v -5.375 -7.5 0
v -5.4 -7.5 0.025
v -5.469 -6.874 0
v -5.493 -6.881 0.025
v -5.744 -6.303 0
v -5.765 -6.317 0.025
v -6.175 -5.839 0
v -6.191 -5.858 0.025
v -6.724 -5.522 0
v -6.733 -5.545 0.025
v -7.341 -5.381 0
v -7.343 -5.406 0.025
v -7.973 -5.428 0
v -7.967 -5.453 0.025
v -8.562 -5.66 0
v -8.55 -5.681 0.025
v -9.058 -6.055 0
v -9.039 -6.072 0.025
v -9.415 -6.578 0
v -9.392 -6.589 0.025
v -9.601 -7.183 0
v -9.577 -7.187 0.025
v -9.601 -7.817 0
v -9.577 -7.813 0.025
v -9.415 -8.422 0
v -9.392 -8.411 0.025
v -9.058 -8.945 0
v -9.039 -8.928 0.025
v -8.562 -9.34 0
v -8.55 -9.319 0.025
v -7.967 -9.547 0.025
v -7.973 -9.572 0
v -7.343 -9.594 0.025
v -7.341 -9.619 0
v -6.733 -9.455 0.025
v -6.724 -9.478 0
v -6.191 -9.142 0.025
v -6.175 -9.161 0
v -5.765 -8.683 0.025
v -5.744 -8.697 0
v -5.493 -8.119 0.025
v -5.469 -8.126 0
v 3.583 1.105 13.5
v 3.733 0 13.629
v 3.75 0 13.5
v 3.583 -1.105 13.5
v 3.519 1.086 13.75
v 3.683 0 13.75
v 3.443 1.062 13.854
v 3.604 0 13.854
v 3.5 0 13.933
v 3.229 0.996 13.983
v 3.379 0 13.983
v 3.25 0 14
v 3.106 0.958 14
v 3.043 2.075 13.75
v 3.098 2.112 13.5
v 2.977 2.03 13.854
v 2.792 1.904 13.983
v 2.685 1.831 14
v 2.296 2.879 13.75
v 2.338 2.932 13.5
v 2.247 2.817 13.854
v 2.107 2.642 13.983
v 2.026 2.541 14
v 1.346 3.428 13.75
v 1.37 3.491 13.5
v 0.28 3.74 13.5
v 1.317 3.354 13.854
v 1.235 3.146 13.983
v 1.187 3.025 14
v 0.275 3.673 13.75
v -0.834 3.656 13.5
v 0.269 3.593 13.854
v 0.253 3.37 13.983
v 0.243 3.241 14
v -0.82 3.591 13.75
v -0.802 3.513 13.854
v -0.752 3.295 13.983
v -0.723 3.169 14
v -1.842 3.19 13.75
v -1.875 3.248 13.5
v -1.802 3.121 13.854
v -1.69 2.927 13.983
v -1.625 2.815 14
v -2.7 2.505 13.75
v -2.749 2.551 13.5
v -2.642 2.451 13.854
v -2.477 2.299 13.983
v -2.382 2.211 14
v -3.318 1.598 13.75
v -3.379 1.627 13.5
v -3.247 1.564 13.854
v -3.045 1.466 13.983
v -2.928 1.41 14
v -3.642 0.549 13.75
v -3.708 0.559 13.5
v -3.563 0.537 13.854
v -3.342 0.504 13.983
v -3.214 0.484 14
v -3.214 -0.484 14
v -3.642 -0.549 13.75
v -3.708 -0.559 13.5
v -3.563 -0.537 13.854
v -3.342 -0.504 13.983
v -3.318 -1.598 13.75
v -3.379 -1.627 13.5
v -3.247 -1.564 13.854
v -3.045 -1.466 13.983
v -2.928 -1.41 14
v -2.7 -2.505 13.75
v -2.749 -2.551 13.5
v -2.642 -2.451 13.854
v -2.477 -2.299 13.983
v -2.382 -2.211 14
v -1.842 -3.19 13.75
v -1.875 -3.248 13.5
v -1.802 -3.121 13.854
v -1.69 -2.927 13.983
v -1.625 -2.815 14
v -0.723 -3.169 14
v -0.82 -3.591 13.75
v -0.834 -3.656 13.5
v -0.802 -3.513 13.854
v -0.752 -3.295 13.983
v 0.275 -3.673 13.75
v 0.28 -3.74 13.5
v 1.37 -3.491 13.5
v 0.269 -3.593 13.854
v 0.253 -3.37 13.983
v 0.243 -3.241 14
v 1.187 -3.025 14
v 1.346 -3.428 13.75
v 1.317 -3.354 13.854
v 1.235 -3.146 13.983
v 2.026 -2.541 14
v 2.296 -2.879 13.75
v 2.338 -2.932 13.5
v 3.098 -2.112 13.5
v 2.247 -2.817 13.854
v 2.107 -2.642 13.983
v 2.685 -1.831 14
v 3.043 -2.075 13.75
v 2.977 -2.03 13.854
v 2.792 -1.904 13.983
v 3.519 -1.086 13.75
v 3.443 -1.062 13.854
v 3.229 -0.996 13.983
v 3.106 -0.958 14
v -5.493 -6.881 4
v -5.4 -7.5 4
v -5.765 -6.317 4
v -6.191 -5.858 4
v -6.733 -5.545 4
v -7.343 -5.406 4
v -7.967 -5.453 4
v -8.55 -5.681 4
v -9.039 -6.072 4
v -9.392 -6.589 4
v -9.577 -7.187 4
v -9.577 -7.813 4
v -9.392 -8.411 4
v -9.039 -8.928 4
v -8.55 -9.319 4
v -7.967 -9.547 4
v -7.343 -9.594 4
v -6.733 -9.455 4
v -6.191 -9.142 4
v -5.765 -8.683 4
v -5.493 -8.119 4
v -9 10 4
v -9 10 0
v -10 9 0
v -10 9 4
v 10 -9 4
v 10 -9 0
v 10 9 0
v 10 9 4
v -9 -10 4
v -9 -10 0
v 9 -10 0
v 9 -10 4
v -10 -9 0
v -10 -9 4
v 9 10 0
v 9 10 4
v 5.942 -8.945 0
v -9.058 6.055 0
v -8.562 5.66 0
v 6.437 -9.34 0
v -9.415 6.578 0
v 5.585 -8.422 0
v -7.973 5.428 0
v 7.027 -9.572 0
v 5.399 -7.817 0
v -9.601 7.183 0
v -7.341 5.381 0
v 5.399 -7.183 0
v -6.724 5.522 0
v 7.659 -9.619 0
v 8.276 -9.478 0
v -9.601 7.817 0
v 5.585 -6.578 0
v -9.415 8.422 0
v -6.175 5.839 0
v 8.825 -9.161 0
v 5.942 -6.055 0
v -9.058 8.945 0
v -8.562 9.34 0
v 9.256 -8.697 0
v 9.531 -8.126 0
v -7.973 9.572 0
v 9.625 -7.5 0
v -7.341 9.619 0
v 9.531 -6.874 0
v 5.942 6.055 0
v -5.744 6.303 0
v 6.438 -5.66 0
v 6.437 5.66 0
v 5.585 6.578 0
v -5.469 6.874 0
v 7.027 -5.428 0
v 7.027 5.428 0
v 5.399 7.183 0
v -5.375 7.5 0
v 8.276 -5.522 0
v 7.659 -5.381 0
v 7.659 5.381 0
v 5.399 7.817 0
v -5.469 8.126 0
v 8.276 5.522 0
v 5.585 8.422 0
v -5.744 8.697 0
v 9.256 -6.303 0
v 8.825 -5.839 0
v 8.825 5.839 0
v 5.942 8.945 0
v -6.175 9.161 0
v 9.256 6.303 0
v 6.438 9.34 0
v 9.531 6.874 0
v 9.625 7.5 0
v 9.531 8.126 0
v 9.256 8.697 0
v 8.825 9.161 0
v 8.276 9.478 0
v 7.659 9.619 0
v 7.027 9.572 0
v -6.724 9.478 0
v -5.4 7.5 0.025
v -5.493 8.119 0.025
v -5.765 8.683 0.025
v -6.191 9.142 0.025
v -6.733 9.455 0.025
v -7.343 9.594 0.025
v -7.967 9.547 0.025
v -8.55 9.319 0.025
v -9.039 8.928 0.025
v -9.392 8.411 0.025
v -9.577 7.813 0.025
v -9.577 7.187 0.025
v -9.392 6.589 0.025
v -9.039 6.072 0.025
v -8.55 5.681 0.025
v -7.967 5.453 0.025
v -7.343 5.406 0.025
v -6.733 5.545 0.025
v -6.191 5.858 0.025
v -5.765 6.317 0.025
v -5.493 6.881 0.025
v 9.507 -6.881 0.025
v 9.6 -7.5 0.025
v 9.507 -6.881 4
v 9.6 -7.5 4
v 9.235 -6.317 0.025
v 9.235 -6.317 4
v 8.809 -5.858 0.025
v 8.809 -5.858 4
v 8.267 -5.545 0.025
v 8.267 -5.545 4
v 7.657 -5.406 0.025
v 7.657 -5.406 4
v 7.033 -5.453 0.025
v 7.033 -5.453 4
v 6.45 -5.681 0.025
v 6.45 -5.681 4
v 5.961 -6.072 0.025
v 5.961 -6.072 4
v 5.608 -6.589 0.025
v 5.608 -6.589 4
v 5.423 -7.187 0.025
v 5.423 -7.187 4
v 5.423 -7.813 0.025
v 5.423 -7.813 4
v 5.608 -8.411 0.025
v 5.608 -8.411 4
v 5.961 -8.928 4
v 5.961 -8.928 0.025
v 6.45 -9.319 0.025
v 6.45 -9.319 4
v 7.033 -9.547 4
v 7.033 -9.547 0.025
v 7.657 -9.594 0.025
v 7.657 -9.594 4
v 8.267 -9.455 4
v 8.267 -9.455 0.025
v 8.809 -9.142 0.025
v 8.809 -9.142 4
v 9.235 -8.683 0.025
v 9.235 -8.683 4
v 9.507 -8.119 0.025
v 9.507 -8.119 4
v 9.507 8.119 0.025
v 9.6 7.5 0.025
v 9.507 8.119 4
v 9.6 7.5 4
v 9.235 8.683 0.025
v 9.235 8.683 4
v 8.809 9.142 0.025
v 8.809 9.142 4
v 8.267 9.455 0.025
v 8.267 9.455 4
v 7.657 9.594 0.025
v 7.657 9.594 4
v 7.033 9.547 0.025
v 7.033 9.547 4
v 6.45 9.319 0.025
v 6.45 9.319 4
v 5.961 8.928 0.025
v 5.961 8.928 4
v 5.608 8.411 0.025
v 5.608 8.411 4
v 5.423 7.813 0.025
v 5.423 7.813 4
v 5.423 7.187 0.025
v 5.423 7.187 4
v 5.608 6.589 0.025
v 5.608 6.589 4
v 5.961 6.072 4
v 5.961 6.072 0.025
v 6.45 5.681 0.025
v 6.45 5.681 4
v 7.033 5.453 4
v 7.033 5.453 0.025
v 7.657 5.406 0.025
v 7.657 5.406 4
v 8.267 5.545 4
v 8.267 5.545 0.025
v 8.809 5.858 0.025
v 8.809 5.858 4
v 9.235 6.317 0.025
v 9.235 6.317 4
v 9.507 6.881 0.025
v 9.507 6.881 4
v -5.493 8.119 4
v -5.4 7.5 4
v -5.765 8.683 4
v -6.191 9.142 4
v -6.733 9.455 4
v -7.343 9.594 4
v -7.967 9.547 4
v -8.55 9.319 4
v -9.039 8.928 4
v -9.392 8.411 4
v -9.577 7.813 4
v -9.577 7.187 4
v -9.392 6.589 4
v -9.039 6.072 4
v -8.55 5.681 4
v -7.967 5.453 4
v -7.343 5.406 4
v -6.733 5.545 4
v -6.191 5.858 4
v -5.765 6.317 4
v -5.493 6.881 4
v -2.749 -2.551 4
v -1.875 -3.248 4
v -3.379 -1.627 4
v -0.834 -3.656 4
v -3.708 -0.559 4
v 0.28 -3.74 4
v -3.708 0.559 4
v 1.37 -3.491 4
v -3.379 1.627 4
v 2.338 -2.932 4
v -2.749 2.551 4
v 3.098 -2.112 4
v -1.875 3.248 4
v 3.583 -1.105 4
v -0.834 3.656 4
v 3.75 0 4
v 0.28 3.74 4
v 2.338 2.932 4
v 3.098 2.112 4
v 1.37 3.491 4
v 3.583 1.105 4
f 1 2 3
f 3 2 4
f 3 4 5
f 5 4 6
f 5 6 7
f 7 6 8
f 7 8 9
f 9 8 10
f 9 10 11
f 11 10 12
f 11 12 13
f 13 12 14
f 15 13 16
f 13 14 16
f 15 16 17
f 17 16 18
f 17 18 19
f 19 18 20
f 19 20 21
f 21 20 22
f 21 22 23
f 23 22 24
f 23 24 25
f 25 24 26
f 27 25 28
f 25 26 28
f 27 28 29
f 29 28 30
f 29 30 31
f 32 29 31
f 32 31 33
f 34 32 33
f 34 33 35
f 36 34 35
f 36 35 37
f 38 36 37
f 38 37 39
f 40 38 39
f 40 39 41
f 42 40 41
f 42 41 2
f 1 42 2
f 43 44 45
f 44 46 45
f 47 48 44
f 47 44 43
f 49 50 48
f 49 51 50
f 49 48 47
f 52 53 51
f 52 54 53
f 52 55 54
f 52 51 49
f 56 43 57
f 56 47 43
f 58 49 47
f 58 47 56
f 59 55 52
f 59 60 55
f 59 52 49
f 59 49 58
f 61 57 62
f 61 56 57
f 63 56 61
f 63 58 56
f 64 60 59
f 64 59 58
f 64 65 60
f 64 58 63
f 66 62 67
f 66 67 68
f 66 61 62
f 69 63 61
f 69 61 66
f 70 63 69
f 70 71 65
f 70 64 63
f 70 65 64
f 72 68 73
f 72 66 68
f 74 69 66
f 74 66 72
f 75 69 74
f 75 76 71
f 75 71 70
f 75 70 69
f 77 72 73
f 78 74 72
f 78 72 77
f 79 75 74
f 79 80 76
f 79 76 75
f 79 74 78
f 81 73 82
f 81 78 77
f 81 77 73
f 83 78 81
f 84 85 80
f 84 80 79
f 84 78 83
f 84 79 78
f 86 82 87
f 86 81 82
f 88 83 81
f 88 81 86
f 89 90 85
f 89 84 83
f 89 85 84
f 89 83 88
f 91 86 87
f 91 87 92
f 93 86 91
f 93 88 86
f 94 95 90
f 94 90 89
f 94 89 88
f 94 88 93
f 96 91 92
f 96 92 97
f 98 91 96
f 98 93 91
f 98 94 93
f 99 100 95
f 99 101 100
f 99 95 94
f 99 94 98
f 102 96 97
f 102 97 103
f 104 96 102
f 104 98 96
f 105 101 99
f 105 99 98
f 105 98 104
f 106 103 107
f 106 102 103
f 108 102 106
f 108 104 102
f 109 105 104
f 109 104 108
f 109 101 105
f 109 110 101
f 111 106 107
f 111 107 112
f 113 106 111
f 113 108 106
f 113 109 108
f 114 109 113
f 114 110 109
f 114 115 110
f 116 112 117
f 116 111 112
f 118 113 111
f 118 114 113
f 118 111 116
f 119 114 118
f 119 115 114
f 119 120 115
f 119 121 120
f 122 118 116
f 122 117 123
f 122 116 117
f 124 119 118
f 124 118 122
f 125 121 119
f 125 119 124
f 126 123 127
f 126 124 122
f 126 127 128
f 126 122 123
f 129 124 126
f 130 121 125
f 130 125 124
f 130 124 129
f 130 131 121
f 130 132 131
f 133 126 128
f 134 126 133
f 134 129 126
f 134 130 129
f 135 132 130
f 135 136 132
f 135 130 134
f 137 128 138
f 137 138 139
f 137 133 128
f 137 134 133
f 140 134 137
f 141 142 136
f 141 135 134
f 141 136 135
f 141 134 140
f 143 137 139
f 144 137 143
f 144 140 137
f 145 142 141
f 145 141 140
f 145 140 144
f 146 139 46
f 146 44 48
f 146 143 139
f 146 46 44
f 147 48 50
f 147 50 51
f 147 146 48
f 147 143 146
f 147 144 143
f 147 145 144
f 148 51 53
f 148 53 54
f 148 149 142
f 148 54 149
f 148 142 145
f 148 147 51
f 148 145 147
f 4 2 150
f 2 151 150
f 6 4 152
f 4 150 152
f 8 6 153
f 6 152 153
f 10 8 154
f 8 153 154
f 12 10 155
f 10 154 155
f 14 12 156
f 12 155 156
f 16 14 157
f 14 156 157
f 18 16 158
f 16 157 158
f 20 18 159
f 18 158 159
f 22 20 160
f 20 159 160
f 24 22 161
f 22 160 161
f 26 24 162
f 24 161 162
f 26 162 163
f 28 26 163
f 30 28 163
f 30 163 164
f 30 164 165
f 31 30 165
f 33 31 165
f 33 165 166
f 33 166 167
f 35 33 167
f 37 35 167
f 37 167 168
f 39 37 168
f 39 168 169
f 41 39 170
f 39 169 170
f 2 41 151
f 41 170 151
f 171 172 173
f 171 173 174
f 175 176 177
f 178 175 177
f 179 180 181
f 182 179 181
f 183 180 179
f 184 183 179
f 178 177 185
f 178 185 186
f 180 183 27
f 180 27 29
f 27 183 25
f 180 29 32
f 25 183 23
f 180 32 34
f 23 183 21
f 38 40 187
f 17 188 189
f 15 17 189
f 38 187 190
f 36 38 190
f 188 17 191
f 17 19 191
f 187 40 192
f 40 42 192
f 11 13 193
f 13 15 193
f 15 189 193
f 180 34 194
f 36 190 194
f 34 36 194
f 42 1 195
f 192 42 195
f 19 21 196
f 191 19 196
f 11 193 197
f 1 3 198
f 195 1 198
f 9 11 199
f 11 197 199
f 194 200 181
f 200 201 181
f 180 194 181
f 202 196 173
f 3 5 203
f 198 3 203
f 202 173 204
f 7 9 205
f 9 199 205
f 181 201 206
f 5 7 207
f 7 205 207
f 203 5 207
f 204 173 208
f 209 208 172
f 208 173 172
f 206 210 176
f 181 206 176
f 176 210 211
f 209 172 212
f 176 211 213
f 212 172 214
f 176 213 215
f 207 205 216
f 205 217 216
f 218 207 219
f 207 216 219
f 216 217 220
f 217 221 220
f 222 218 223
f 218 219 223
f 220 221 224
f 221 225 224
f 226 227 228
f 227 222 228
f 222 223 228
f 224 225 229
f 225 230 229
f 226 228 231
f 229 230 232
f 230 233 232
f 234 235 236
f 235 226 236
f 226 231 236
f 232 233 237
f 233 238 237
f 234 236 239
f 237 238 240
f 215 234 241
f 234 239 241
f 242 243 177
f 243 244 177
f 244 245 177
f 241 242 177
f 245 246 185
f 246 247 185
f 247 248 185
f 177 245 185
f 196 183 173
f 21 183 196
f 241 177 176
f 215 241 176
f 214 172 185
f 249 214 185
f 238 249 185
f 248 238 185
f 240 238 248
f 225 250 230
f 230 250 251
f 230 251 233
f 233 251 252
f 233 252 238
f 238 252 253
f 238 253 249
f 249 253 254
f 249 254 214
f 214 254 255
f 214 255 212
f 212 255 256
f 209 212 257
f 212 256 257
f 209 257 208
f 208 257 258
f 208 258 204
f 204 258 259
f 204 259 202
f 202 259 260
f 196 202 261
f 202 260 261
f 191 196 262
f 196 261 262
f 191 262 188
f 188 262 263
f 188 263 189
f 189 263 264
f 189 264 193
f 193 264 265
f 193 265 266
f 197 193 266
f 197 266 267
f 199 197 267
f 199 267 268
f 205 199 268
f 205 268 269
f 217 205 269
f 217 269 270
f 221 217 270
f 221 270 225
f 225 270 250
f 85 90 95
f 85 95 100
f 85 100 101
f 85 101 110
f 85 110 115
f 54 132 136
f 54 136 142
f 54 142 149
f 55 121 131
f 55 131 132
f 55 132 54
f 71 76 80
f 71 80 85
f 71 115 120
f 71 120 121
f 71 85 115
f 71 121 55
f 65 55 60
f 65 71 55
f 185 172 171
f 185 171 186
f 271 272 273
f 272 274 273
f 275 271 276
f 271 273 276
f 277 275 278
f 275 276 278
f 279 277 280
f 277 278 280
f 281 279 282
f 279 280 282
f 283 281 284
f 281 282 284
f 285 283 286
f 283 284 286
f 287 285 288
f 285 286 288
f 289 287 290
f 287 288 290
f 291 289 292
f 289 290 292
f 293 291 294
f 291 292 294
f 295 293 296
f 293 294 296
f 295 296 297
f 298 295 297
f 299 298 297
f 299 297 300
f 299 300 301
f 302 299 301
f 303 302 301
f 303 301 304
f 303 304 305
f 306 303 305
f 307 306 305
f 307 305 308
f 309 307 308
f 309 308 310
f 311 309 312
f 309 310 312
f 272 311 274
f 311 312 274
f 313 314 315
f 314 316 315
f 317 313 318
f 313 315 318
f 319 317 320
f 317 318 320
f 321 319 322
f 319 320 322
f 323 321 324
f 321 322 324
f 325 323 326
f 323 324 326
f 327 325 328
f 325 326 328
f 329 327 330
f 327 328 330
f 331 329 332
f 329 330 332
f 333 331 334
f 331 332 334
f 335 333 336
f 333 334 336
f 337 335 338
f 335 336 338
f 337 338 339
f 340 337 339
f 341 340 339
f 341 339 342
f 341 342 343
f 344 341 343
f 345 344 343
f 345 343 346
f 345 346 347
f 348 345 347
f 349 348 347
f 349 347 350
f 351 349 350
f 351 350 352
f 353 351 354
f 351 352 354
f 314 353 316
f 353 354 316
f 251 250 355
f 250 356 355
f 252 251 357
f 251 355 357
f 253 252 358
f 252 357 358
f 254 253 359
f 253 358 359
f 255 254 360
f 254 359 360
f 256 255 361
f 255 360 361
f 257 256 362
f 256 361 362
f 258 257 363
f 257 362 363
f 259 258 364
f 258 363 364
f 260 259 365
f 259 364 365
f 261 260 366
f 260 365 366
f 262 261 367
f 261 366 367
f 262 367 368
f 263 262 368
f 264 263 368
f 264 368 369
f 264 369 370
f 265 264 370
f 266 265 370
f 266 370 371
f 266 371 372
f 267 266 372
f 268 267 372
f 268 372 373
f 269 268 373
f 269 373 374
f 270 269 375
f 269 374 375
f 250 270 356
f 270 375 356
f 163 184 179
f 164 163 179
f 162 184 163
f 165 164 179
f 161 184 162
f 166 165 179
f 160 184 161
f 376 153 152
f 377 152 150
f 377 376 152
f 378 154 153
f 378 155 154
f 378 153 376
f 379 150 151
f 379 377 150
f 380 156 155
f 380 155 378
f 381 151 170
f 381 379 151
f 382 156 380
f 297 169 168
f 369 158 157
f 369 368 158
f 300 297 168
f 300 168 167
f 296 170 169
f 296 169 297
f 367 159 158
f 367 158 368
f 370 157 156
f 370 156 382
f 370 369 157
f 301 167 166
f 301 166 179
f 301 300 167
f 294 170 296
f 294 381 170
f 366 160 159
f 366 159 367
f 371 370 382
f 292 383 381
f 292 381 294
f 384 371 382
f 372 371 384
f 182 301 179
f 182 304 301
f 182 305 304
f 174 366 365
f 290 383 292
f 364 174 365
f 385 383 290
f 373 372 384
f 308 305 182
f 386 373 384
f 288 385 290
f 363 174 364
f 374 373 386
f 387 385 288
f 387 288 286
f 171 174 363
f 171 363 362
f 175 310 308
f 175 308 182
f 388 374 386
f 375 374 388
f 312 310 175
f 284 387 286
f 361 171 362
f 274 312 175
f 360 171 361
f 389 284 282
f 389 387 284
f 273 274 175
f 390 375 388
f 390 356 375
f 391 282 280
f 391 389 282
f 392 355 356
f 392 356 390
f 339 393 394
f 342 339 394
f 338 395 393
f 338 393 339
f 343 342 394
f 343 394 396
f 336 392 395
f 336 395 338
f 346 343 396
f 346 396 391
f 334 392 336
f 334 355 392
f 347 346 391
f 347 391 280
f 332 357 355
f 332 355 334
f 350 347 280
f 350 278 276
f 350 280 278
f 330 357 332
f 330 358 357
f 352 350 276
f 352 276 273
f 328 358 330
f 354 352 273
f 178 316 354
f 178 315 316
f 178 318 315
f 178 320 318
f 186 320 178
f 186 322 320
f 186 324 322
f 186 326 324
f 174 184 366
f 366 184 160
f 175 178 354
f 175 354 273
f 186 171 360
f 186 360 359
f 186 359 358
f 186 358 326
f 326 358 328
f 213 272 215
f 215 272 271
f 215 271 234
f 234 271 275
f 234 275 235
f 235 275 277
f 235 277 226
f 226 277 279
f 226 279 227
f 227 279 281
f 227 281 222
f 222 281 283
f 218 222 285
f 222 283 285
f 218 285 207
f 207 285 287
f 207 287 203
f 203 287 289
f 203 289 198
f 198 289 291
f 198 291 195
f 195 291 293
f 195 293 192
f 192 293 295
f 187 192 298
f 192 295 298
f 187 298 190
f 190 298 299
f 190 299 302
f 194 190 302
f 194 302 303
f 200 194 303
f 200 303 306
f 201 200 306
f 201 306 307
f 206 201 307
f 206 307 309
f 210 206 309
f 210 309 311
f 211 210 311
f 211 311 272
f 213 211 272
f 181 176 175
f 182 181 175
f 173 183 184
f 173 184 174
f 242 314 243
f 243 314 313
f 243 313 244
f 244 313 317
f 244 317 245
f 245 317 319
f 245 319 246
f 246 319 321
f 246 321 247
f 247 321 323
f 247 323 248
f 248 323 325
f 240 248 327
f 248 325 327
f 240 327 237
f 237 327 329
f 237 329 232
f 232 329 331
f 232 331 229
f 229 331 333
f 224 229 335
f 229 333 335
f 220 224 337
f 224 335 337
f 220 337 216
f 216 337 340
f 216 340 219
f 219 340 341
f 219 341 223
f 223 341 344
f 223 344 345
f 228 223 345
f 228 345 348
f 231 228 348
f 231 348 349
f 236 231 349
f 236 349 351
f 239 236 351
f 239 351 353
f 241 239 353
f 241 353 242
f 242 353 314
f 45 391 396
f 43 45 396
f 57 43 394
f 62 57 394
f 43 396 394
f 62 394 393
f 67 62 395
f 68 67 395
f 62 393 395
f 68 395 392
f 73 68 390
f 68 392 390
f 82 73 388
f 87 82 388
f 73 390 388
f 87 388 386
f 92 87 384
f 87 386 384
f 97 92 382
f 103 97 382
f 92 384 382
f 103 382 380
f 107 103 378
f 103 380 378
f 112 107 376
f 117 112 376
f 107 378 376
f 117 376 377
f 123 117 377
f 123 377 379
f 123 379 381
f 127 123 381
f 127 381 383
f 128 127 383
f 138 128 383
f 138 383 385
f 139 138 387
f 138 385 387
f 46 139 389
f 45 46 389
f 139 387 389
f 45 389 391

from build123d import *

# Parameters (mm, degrees)
SKETCH_1_W                        = 20
SKETCH_1_H                        = 20
EXTRUDE_1_DEPTH                   = 4
SKETCH_2_R                        = 3.75
EXTRUDE_2_DEPTH                   = 10
HOLE_WIZARD_4_2_4_2_1_D           = 4.2
HOLE_WIZARD_4_2_4_2_1_CSINK_D     = 4.25
HOLE_WIZARD_4_2_4_2_1_CSINK_ANGLE = 90
FILLET_1_R                        = 0.5
CHAMFER_1_SIZE                    = 1


with BuildPart() as part:
    # 草图1 → 凸台-拉伸1 (new body)
    with BuildSketch(Plane.XY):
        Rectangle(SKETCH_1_W, SKETCH_1_H)
    extrude(amount=EXTRUDE_1_DEPTH)

    # 草图2 → 凸台-拉伸2 (add)
    with BuildSketch(Plane.XY.offset(4)):
        Circle(SKETCH_2_R)
    extrude(amount=EXTRUDE_2_DEPTH)

    # Ø4.2 (4.2) 直径孔1 (through all)
    with Locations(Plane(origin=(7.5, 7.5, 0), x_dir=(-1, 0, 0), z_dir=(0, 0, -1))):
        with Locations((0, 0), (15, 0), (15, -15), (0, -15)):
            CounterSinkHole(HOLE_WIZARD_4_2_4_2_1_D / 2, HOLE_WIZARD_4_2_4_2_1_CSINK_D / 2, counter_sink_angle=HOLE_WIZARD_4_2_4_2_1_CSINK_ANGLE)

    # 圆角1
    fillet_1_edges = [part.edges().sort_by_distance(p)[0] for p in [
        (-3.75, 0, 14),
    ]]
    fillet(fillet_1_edges, radius=FILLET_1_R)

    # 倒角1
    chamfer_1_edges = [part.edges().sort_by_distance(p)[0] for p in [
        (10, -10, 2),
        (-10, -10, 2),
        (-10, 10, 2),
        (10, 10, 2),
    ]]
    chamfer(chamfer_1_edges, length=CHAMFER_1_SIZE)


solid = part.part
